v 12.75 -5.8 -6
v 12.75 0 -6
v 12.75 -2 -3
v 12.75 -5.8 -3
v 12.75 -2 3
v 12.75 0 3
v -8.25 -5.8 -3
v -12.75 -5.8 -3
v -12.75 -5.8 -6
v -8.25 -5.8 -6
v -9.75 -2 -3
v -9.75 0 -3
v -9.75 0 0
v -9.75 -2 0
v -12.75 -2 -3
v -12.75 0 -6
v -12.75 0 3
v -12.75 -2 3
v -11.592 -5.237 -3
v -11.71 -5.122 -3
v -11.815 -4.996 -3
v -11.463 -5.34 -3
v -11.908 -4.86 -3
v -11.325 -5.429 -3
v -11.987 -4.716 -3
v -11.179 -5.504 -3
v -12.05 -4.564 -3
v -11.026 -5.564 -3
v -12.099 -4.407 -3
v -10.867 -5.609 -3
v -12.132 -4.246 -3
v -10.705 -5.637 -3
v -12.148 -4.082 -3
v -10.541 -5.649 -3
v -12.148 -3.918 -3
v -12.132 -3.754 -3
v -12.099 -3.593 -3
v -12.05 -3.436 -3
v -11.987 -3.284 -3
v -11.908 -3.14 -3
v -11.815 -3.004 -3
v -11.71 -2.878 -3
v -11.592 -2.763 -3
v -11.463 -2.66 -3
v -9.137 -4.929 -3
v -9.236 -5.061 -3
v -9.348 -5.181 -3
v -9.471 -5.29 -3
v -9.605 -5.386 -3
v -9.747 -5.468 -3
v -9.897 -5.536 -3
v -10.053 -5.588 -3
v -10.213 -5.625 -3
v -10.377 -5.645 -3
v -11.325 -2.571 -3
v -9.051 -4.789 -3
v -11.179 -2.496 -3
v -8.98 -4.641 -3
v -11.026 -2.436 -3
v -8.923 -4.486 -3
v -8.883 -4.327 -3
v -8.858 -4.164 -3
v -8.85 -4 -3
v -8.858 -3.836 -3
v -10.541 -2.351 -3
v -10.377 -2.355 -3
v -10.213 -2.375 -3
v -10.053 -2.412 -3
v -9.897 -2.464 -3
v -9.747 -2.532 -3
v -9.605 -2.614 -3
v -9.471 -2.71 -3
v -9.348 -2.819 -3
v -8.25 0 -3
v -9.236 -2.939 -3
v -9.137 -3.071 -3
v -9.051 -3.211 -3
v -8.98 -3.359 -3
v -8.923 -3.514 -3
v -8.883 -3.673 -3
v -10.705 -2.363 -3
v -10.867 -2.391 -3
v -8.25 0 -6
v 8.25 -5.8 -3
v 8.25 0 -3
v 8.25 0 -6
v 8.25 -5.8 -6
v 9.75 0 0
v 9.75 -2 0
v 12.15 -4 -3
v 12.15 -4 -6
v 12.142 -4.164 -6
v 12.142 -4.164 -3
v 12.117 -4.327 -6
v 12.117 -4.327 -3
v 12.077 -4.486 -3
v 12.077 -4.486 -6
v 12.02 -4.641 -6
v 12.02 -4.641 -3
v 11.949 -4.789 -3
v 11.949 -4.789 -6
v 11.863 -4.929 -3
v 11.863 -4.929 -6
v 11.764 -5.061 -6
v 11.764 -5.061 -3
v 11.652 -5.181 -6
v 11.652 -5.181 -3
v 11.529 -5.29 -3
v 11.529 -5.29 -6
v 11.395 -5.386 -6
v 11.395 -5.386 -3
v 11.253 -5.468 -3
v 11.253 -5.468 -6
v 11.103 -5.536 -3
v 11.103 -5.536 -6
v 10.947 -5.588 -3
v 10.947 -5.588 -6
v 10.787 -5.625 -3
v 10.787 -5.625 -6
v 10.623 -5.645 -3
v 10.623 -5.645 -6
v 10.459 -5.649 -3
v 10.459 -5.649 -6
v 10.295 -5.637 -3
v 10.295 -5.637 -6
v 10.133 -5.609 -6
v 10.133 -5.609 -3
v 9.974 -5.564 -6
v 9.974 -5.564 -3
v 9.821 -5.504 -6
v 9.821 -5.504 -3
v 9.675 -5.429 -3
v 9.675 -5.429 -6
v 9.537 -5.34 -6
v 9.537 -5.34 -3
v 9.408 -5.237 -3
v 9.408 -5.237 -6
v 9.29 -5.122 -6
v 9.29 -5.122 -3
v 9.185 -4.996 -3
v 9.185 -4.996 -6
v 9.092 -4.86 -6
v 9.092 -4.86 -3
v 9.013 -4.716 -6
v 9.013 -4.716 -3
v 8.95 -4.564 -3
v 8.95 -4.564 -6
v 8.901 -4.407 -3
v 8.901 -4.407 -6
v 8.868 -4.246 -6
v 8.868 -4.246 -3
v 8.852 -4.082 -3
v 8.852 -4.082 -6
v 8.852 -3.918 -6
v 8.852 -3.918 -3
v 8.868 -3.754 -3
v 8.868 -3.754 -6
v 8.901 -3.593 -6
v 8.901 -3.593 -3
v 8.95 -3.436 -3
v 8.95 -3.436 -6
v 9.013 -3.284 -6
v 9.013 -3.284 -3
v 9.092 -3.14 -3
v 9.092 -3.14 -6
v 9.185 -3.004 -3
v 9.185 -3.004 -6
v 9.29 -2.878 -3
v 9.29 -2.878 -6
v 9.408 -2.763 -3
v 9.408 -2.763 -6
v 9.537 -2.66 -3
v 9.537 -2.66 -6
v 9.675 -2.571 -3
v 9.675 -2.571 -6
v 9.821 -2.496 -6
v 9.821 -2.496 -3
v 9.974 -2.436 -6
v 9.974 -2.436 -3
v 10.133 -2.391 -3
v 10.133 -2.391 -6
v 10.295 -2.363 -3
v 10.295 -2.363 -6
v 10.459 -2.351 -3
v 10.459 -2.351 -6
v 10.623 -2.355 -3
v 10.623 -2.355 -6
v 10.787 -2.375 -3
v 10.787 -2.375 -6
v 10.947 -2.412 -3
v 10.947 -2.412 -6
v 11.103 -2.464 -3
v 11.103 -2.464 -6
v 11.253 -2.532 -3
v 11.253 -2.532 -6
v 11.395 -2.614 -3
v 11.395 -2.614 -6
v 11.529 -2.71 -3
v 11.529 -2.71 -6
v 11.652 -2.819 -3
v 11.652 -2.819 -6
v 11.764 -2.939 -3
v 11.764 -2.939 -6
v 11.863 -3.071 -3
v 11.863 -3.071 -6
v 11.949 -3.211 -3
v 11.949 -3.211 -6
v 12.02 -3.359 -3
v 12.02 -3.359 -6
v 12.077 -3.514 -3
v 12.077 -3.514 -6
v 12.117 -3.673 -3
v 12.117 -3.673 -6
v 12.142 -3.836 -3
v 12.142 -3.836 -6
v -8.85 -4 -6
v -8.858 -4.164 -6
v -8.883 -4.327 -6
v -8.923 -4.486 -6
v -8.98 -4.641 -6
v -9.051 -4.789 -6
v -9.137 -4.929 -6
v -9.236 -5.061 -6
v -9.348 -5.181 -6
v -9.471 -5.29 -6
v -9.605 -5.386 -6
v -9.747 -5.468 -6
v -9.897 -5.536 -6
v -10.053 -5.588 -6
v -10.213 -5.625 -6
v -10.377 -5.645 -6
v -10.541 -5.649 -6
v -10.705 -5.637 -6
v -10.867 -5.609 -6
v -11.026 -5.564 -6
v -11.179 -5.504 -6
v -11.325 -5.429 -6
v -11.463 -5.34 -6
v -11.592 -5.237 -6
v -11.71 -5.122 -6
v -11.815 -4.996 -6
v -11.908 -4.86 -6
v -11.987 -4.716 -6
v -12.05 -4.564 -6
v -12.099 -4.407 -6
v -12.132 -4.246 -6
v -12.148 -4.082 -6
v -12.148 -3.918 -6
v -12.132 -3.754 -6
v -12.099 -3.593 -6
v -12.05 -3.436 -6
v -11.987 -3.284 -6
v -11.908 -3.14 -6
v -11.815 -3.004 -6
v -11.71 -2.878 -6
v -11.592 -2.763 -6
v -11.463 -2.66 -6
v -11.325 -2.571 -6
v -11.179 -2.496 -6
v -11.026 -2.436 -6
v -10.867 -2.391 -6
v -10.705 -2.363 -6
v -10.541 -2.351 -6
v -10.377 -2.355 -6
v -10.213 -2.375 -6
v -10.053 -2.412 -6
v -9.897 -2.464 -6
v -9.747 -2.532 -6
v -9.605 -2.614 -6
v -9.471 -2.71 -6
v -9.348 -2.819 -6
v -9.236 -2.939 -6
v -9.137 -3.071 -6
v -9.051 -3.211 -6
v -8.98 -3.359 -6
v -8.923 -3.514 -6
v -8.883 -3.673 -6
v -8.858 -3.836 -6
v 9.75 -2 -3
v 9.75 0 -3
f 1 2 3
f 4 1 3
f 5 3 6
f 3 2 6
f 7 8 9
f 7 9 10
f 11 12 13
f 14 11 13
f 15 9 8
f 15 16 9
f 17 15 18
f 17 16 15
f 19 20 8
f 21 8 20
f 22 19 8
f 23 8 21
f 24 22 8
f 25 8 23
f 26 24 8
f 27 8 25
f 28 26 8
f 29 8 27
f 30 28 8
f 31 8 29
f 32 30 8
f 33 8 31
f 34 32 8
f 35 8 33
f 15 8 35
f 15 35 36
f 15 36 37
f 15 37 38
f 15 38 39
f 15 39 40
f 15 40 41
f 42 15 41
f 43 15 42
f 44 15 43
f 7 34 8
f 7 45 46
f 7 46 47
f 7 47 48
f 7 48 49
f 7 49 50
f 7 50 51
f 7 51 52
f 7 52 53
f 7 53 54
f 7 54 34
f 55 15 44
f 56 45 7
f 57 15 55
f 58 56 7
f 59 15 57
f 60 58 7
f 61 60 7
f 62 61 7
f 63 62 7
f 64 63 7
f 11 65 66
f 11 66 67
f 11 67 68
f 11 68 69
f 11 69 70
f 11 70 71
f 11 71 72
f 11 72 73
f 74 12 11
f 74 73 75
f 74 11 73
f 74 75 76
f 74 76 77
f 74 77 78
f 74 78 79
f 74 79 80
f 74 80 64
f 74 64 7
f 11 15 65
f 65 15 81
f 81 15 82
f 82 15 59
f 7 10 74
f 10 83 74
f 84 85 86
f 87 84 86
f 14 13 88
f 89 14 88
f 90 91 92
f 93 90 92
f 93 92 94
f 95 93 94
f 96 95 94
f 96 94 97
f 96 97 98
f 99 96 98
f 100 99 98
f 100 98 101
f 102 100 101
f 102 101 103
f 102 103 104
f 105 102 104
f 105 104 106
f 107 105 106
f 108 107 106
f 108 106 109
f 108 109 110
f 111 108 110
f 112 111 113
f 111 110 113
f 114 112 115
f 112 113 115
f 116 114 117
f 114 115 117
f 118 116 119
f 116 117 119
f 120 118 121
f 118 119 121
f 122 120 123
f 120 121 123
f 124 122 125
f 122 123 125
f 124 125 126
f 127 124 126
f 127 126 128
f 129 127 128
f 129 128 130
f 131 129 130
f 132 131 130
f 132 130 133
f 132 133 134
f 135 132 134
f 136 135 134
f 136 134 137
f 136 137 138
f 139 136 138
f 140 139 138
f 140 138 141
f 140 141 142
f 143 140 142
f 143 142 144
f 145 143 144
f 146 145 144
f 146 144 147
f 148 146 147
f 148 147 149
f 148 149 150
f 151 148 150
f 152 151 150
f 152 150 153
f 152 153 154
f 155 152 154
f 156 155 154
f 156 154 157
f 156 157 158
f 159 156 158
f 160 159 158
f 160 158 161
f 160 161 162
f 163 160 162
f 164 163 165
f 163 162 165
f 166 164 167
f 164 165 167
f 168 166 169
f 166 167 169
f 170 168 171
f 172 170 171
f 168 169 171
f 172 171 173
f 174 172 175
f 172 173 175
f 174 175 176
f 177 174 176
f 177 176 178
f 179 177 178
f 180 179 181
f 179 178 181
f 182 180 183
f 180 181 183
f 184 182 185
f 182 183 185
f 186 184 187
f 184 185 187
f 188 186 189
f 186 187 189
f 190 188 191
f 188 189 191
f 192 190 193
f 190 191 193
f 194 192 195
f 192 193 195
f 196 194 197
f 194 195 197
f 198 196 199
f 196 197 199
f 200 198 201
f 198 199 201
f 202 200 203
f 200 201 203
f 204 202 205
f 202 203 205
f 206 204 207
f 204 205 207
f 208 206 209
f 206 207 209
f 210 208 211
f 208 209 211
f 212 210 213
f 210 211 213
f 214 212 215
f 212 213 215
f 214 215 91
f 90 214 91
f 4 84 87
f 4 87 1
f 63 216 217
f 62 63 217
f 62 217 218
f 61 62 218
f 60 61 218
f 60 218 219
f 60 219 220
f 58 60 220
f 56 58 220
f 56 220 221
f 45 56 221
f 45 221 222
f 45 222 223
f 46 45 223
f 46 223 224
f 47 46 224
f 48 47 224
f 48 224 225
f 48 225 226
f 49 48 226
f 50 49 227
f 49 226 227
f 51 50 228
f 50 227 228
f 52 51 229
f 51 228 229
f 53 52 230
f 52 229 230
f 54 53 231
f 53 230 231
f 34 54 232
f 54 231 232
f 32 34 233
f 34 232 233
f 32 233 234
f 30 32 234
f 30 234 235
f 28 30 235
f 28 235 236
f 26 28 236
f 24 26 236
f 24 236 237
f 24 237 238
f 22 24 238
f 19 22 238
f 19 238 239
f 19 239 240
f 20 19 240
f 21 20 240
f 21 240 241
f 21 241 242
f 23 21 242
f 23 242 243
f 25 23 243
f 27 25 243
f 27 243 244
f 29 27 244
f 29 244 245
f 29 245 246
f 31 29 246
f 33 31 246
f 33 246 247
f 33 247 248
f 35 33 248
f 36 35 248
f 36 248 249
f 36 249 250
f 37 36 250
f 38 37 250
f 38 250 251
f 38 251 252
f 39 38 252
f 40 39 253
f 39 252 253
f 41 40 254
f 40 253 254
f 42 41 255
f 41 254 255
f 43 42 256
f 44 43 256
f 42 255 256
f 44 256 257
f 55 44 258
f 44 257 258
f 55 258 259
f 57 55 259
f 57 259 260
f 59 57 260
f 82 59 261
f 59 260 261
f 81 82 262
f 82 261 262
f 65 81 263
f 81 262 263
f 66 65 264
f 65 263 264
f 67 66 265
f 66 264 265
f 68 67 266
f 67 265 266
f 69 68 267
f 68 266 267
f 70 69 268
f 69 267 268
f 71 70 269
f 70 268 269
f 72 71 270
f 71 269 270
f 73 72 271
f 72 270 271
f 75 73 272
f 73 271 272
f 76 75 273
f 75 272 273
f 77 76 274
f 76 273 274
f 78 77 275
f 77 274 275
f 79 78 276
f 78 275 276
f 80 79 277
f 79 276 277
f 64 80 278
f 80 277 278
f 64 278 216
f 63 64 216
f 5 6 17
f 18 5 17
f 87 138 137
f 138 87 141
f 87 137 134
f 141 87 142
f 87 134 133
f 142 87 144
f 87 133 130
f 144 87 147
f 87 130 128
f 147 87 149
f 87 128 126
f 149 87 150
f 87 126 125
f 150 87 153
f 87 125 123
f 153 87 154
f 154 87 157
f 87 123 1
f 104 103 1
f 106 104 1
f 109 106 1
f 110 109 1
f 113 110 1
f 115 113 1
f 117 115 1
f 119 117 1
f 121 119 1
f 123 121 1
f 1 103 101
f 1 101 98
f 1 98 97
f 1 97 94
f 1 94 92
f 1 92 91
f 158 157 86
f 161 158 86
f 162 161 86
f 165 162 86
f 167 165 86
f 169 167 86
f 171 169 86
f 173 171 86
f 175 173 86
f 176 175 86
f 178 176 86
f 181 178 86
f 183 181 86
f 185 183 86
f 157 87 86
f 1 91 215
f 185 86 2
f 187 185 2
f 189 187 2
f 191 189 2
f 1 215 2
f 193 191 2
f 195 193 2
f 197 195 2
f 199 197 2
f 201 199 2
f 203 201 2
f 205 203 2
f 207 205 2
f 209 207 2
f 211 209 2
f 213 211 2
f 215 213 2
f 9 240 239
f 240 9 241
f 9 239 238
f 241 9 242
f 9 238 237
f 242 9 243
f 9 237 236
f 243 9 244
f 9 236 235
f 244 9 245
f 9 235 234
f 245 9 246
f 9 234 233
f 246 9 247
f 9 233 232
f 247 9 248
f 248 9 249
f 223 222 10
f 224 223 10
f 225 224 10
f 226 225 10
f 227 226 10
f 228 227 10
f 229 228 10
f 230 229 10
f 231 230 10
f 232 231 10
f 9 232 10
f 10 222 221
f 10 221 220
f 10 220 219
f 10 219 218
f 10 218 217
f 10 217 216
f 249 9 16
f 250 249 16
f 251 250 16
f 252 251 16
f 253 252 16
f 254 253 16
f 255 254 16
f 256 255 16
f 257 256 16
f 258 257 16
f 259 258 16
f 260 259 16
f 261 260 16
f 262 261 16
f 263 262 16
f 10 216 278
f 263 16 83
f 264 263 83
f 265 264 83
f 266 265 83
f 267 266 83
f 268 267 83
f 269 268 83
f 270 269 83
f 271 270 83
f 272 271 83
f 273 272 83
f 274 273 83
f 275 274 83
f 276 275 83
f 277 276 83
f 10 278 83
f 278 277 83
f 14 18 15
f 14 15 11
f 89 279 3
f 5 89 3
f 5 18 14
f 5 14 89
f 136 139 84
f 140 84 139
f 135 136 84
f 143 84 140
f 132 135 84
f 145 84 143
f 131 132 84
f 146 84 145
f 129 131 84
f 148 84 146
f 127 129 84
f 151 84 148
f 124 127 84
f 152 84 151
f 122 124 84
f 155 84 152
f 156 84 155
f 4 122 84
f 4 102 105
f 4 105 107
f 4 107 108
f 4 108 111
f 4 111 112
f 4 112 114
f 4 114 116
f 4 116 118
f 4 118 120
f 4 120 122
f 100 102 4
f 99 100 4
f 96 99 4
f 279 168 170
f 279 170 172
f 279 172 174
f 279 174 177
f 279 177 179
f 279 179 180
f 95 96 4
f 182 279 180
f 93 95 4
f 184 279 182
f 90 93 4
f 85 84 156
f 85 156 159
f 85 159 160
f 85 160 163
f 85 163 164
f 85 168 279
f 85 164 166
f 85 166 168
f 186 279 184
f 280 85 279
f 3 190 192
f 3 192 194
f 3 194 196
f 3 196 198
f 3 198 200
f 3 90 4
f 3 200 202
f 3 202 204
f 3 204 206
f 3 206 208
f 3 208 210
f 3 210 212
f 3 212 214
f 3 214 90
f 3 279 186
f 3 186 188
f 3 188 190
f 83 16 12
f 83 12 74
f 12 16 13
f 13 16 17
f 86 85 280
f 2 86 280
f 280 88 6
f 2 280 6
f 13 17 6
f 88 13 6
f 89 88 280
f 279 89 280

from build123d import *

# Parameters (mm, degrees)
F0_W     = 9.75
F0_H     = 3
F0_W_2   = 3
F0_W_3   = 1.5
F1_DEPTH = 2
F2_W     = 4.5
F2_H     = 3
F3_DEPTH = 3.8
F4_R     = 1.65
F5_DEPTH = 9.001


with BuildPart() as f1:
    # F0 (on Front) → F1 (new body)
    with BuildSketch(Plane.XZ):
        Polygon((-8.25, 0), (0, 0), (0, 3), (-9.75, 3), (-9.75, 0), align=None)
        with Locations((4.875, 1.5)):
            Rectangle(F0_W, F0_H)
        Polygon((9.75, 3), (9.75, 0), (9.75, -3), (12.75, -3), (12.75, 3), align=None)
        with Locations((-11.25, 1.5)):
            Rectangle(F0_W_2, F0_H)
        with Locations((-11.25, -1.5)):
            Rectangle(F0_W_2, F0_H)
        Polygon((12.75, -3), (9.75, -3), (8.25, -3), (8.25, -6), (12.75, -6), align=None)
        with Locations((-11.25, -4.5)):
            Rectangle(F0_W_2, F0_H)
        with Locations((-9, -4.5)):
            Rectangle(F0_W_3, F0_H)
    extrude(amount=F1_DEPTH)

    # F2 (on face) → F3 (join)
    with BuildSketch(Plane.XZ.offset(2)):
        with Locations((-10.5, -4.5)):
            Rectangle(F2_W, F2_H)
        with Locations((10.5, -4.5)):
            Rectangle(F2_W, F2_H)
    extrude(amount=F3_DEPTH)

    # F4 (on face) → F5 (cut, through all)
    with BuildSketch(Plane(origin=(0, 0, -6), x_dir=(1, 0, 0), z_dir=(0, 0, -1))):
        with Locations((-10.5, 4)):
            Circle(F4_R)
        with Locations((10.5, 4)):
            Circle(F4_R)
    extrude(amount=-F5_DEPTH, mode=Mode.SUBTRACT)


solid = f1.part
